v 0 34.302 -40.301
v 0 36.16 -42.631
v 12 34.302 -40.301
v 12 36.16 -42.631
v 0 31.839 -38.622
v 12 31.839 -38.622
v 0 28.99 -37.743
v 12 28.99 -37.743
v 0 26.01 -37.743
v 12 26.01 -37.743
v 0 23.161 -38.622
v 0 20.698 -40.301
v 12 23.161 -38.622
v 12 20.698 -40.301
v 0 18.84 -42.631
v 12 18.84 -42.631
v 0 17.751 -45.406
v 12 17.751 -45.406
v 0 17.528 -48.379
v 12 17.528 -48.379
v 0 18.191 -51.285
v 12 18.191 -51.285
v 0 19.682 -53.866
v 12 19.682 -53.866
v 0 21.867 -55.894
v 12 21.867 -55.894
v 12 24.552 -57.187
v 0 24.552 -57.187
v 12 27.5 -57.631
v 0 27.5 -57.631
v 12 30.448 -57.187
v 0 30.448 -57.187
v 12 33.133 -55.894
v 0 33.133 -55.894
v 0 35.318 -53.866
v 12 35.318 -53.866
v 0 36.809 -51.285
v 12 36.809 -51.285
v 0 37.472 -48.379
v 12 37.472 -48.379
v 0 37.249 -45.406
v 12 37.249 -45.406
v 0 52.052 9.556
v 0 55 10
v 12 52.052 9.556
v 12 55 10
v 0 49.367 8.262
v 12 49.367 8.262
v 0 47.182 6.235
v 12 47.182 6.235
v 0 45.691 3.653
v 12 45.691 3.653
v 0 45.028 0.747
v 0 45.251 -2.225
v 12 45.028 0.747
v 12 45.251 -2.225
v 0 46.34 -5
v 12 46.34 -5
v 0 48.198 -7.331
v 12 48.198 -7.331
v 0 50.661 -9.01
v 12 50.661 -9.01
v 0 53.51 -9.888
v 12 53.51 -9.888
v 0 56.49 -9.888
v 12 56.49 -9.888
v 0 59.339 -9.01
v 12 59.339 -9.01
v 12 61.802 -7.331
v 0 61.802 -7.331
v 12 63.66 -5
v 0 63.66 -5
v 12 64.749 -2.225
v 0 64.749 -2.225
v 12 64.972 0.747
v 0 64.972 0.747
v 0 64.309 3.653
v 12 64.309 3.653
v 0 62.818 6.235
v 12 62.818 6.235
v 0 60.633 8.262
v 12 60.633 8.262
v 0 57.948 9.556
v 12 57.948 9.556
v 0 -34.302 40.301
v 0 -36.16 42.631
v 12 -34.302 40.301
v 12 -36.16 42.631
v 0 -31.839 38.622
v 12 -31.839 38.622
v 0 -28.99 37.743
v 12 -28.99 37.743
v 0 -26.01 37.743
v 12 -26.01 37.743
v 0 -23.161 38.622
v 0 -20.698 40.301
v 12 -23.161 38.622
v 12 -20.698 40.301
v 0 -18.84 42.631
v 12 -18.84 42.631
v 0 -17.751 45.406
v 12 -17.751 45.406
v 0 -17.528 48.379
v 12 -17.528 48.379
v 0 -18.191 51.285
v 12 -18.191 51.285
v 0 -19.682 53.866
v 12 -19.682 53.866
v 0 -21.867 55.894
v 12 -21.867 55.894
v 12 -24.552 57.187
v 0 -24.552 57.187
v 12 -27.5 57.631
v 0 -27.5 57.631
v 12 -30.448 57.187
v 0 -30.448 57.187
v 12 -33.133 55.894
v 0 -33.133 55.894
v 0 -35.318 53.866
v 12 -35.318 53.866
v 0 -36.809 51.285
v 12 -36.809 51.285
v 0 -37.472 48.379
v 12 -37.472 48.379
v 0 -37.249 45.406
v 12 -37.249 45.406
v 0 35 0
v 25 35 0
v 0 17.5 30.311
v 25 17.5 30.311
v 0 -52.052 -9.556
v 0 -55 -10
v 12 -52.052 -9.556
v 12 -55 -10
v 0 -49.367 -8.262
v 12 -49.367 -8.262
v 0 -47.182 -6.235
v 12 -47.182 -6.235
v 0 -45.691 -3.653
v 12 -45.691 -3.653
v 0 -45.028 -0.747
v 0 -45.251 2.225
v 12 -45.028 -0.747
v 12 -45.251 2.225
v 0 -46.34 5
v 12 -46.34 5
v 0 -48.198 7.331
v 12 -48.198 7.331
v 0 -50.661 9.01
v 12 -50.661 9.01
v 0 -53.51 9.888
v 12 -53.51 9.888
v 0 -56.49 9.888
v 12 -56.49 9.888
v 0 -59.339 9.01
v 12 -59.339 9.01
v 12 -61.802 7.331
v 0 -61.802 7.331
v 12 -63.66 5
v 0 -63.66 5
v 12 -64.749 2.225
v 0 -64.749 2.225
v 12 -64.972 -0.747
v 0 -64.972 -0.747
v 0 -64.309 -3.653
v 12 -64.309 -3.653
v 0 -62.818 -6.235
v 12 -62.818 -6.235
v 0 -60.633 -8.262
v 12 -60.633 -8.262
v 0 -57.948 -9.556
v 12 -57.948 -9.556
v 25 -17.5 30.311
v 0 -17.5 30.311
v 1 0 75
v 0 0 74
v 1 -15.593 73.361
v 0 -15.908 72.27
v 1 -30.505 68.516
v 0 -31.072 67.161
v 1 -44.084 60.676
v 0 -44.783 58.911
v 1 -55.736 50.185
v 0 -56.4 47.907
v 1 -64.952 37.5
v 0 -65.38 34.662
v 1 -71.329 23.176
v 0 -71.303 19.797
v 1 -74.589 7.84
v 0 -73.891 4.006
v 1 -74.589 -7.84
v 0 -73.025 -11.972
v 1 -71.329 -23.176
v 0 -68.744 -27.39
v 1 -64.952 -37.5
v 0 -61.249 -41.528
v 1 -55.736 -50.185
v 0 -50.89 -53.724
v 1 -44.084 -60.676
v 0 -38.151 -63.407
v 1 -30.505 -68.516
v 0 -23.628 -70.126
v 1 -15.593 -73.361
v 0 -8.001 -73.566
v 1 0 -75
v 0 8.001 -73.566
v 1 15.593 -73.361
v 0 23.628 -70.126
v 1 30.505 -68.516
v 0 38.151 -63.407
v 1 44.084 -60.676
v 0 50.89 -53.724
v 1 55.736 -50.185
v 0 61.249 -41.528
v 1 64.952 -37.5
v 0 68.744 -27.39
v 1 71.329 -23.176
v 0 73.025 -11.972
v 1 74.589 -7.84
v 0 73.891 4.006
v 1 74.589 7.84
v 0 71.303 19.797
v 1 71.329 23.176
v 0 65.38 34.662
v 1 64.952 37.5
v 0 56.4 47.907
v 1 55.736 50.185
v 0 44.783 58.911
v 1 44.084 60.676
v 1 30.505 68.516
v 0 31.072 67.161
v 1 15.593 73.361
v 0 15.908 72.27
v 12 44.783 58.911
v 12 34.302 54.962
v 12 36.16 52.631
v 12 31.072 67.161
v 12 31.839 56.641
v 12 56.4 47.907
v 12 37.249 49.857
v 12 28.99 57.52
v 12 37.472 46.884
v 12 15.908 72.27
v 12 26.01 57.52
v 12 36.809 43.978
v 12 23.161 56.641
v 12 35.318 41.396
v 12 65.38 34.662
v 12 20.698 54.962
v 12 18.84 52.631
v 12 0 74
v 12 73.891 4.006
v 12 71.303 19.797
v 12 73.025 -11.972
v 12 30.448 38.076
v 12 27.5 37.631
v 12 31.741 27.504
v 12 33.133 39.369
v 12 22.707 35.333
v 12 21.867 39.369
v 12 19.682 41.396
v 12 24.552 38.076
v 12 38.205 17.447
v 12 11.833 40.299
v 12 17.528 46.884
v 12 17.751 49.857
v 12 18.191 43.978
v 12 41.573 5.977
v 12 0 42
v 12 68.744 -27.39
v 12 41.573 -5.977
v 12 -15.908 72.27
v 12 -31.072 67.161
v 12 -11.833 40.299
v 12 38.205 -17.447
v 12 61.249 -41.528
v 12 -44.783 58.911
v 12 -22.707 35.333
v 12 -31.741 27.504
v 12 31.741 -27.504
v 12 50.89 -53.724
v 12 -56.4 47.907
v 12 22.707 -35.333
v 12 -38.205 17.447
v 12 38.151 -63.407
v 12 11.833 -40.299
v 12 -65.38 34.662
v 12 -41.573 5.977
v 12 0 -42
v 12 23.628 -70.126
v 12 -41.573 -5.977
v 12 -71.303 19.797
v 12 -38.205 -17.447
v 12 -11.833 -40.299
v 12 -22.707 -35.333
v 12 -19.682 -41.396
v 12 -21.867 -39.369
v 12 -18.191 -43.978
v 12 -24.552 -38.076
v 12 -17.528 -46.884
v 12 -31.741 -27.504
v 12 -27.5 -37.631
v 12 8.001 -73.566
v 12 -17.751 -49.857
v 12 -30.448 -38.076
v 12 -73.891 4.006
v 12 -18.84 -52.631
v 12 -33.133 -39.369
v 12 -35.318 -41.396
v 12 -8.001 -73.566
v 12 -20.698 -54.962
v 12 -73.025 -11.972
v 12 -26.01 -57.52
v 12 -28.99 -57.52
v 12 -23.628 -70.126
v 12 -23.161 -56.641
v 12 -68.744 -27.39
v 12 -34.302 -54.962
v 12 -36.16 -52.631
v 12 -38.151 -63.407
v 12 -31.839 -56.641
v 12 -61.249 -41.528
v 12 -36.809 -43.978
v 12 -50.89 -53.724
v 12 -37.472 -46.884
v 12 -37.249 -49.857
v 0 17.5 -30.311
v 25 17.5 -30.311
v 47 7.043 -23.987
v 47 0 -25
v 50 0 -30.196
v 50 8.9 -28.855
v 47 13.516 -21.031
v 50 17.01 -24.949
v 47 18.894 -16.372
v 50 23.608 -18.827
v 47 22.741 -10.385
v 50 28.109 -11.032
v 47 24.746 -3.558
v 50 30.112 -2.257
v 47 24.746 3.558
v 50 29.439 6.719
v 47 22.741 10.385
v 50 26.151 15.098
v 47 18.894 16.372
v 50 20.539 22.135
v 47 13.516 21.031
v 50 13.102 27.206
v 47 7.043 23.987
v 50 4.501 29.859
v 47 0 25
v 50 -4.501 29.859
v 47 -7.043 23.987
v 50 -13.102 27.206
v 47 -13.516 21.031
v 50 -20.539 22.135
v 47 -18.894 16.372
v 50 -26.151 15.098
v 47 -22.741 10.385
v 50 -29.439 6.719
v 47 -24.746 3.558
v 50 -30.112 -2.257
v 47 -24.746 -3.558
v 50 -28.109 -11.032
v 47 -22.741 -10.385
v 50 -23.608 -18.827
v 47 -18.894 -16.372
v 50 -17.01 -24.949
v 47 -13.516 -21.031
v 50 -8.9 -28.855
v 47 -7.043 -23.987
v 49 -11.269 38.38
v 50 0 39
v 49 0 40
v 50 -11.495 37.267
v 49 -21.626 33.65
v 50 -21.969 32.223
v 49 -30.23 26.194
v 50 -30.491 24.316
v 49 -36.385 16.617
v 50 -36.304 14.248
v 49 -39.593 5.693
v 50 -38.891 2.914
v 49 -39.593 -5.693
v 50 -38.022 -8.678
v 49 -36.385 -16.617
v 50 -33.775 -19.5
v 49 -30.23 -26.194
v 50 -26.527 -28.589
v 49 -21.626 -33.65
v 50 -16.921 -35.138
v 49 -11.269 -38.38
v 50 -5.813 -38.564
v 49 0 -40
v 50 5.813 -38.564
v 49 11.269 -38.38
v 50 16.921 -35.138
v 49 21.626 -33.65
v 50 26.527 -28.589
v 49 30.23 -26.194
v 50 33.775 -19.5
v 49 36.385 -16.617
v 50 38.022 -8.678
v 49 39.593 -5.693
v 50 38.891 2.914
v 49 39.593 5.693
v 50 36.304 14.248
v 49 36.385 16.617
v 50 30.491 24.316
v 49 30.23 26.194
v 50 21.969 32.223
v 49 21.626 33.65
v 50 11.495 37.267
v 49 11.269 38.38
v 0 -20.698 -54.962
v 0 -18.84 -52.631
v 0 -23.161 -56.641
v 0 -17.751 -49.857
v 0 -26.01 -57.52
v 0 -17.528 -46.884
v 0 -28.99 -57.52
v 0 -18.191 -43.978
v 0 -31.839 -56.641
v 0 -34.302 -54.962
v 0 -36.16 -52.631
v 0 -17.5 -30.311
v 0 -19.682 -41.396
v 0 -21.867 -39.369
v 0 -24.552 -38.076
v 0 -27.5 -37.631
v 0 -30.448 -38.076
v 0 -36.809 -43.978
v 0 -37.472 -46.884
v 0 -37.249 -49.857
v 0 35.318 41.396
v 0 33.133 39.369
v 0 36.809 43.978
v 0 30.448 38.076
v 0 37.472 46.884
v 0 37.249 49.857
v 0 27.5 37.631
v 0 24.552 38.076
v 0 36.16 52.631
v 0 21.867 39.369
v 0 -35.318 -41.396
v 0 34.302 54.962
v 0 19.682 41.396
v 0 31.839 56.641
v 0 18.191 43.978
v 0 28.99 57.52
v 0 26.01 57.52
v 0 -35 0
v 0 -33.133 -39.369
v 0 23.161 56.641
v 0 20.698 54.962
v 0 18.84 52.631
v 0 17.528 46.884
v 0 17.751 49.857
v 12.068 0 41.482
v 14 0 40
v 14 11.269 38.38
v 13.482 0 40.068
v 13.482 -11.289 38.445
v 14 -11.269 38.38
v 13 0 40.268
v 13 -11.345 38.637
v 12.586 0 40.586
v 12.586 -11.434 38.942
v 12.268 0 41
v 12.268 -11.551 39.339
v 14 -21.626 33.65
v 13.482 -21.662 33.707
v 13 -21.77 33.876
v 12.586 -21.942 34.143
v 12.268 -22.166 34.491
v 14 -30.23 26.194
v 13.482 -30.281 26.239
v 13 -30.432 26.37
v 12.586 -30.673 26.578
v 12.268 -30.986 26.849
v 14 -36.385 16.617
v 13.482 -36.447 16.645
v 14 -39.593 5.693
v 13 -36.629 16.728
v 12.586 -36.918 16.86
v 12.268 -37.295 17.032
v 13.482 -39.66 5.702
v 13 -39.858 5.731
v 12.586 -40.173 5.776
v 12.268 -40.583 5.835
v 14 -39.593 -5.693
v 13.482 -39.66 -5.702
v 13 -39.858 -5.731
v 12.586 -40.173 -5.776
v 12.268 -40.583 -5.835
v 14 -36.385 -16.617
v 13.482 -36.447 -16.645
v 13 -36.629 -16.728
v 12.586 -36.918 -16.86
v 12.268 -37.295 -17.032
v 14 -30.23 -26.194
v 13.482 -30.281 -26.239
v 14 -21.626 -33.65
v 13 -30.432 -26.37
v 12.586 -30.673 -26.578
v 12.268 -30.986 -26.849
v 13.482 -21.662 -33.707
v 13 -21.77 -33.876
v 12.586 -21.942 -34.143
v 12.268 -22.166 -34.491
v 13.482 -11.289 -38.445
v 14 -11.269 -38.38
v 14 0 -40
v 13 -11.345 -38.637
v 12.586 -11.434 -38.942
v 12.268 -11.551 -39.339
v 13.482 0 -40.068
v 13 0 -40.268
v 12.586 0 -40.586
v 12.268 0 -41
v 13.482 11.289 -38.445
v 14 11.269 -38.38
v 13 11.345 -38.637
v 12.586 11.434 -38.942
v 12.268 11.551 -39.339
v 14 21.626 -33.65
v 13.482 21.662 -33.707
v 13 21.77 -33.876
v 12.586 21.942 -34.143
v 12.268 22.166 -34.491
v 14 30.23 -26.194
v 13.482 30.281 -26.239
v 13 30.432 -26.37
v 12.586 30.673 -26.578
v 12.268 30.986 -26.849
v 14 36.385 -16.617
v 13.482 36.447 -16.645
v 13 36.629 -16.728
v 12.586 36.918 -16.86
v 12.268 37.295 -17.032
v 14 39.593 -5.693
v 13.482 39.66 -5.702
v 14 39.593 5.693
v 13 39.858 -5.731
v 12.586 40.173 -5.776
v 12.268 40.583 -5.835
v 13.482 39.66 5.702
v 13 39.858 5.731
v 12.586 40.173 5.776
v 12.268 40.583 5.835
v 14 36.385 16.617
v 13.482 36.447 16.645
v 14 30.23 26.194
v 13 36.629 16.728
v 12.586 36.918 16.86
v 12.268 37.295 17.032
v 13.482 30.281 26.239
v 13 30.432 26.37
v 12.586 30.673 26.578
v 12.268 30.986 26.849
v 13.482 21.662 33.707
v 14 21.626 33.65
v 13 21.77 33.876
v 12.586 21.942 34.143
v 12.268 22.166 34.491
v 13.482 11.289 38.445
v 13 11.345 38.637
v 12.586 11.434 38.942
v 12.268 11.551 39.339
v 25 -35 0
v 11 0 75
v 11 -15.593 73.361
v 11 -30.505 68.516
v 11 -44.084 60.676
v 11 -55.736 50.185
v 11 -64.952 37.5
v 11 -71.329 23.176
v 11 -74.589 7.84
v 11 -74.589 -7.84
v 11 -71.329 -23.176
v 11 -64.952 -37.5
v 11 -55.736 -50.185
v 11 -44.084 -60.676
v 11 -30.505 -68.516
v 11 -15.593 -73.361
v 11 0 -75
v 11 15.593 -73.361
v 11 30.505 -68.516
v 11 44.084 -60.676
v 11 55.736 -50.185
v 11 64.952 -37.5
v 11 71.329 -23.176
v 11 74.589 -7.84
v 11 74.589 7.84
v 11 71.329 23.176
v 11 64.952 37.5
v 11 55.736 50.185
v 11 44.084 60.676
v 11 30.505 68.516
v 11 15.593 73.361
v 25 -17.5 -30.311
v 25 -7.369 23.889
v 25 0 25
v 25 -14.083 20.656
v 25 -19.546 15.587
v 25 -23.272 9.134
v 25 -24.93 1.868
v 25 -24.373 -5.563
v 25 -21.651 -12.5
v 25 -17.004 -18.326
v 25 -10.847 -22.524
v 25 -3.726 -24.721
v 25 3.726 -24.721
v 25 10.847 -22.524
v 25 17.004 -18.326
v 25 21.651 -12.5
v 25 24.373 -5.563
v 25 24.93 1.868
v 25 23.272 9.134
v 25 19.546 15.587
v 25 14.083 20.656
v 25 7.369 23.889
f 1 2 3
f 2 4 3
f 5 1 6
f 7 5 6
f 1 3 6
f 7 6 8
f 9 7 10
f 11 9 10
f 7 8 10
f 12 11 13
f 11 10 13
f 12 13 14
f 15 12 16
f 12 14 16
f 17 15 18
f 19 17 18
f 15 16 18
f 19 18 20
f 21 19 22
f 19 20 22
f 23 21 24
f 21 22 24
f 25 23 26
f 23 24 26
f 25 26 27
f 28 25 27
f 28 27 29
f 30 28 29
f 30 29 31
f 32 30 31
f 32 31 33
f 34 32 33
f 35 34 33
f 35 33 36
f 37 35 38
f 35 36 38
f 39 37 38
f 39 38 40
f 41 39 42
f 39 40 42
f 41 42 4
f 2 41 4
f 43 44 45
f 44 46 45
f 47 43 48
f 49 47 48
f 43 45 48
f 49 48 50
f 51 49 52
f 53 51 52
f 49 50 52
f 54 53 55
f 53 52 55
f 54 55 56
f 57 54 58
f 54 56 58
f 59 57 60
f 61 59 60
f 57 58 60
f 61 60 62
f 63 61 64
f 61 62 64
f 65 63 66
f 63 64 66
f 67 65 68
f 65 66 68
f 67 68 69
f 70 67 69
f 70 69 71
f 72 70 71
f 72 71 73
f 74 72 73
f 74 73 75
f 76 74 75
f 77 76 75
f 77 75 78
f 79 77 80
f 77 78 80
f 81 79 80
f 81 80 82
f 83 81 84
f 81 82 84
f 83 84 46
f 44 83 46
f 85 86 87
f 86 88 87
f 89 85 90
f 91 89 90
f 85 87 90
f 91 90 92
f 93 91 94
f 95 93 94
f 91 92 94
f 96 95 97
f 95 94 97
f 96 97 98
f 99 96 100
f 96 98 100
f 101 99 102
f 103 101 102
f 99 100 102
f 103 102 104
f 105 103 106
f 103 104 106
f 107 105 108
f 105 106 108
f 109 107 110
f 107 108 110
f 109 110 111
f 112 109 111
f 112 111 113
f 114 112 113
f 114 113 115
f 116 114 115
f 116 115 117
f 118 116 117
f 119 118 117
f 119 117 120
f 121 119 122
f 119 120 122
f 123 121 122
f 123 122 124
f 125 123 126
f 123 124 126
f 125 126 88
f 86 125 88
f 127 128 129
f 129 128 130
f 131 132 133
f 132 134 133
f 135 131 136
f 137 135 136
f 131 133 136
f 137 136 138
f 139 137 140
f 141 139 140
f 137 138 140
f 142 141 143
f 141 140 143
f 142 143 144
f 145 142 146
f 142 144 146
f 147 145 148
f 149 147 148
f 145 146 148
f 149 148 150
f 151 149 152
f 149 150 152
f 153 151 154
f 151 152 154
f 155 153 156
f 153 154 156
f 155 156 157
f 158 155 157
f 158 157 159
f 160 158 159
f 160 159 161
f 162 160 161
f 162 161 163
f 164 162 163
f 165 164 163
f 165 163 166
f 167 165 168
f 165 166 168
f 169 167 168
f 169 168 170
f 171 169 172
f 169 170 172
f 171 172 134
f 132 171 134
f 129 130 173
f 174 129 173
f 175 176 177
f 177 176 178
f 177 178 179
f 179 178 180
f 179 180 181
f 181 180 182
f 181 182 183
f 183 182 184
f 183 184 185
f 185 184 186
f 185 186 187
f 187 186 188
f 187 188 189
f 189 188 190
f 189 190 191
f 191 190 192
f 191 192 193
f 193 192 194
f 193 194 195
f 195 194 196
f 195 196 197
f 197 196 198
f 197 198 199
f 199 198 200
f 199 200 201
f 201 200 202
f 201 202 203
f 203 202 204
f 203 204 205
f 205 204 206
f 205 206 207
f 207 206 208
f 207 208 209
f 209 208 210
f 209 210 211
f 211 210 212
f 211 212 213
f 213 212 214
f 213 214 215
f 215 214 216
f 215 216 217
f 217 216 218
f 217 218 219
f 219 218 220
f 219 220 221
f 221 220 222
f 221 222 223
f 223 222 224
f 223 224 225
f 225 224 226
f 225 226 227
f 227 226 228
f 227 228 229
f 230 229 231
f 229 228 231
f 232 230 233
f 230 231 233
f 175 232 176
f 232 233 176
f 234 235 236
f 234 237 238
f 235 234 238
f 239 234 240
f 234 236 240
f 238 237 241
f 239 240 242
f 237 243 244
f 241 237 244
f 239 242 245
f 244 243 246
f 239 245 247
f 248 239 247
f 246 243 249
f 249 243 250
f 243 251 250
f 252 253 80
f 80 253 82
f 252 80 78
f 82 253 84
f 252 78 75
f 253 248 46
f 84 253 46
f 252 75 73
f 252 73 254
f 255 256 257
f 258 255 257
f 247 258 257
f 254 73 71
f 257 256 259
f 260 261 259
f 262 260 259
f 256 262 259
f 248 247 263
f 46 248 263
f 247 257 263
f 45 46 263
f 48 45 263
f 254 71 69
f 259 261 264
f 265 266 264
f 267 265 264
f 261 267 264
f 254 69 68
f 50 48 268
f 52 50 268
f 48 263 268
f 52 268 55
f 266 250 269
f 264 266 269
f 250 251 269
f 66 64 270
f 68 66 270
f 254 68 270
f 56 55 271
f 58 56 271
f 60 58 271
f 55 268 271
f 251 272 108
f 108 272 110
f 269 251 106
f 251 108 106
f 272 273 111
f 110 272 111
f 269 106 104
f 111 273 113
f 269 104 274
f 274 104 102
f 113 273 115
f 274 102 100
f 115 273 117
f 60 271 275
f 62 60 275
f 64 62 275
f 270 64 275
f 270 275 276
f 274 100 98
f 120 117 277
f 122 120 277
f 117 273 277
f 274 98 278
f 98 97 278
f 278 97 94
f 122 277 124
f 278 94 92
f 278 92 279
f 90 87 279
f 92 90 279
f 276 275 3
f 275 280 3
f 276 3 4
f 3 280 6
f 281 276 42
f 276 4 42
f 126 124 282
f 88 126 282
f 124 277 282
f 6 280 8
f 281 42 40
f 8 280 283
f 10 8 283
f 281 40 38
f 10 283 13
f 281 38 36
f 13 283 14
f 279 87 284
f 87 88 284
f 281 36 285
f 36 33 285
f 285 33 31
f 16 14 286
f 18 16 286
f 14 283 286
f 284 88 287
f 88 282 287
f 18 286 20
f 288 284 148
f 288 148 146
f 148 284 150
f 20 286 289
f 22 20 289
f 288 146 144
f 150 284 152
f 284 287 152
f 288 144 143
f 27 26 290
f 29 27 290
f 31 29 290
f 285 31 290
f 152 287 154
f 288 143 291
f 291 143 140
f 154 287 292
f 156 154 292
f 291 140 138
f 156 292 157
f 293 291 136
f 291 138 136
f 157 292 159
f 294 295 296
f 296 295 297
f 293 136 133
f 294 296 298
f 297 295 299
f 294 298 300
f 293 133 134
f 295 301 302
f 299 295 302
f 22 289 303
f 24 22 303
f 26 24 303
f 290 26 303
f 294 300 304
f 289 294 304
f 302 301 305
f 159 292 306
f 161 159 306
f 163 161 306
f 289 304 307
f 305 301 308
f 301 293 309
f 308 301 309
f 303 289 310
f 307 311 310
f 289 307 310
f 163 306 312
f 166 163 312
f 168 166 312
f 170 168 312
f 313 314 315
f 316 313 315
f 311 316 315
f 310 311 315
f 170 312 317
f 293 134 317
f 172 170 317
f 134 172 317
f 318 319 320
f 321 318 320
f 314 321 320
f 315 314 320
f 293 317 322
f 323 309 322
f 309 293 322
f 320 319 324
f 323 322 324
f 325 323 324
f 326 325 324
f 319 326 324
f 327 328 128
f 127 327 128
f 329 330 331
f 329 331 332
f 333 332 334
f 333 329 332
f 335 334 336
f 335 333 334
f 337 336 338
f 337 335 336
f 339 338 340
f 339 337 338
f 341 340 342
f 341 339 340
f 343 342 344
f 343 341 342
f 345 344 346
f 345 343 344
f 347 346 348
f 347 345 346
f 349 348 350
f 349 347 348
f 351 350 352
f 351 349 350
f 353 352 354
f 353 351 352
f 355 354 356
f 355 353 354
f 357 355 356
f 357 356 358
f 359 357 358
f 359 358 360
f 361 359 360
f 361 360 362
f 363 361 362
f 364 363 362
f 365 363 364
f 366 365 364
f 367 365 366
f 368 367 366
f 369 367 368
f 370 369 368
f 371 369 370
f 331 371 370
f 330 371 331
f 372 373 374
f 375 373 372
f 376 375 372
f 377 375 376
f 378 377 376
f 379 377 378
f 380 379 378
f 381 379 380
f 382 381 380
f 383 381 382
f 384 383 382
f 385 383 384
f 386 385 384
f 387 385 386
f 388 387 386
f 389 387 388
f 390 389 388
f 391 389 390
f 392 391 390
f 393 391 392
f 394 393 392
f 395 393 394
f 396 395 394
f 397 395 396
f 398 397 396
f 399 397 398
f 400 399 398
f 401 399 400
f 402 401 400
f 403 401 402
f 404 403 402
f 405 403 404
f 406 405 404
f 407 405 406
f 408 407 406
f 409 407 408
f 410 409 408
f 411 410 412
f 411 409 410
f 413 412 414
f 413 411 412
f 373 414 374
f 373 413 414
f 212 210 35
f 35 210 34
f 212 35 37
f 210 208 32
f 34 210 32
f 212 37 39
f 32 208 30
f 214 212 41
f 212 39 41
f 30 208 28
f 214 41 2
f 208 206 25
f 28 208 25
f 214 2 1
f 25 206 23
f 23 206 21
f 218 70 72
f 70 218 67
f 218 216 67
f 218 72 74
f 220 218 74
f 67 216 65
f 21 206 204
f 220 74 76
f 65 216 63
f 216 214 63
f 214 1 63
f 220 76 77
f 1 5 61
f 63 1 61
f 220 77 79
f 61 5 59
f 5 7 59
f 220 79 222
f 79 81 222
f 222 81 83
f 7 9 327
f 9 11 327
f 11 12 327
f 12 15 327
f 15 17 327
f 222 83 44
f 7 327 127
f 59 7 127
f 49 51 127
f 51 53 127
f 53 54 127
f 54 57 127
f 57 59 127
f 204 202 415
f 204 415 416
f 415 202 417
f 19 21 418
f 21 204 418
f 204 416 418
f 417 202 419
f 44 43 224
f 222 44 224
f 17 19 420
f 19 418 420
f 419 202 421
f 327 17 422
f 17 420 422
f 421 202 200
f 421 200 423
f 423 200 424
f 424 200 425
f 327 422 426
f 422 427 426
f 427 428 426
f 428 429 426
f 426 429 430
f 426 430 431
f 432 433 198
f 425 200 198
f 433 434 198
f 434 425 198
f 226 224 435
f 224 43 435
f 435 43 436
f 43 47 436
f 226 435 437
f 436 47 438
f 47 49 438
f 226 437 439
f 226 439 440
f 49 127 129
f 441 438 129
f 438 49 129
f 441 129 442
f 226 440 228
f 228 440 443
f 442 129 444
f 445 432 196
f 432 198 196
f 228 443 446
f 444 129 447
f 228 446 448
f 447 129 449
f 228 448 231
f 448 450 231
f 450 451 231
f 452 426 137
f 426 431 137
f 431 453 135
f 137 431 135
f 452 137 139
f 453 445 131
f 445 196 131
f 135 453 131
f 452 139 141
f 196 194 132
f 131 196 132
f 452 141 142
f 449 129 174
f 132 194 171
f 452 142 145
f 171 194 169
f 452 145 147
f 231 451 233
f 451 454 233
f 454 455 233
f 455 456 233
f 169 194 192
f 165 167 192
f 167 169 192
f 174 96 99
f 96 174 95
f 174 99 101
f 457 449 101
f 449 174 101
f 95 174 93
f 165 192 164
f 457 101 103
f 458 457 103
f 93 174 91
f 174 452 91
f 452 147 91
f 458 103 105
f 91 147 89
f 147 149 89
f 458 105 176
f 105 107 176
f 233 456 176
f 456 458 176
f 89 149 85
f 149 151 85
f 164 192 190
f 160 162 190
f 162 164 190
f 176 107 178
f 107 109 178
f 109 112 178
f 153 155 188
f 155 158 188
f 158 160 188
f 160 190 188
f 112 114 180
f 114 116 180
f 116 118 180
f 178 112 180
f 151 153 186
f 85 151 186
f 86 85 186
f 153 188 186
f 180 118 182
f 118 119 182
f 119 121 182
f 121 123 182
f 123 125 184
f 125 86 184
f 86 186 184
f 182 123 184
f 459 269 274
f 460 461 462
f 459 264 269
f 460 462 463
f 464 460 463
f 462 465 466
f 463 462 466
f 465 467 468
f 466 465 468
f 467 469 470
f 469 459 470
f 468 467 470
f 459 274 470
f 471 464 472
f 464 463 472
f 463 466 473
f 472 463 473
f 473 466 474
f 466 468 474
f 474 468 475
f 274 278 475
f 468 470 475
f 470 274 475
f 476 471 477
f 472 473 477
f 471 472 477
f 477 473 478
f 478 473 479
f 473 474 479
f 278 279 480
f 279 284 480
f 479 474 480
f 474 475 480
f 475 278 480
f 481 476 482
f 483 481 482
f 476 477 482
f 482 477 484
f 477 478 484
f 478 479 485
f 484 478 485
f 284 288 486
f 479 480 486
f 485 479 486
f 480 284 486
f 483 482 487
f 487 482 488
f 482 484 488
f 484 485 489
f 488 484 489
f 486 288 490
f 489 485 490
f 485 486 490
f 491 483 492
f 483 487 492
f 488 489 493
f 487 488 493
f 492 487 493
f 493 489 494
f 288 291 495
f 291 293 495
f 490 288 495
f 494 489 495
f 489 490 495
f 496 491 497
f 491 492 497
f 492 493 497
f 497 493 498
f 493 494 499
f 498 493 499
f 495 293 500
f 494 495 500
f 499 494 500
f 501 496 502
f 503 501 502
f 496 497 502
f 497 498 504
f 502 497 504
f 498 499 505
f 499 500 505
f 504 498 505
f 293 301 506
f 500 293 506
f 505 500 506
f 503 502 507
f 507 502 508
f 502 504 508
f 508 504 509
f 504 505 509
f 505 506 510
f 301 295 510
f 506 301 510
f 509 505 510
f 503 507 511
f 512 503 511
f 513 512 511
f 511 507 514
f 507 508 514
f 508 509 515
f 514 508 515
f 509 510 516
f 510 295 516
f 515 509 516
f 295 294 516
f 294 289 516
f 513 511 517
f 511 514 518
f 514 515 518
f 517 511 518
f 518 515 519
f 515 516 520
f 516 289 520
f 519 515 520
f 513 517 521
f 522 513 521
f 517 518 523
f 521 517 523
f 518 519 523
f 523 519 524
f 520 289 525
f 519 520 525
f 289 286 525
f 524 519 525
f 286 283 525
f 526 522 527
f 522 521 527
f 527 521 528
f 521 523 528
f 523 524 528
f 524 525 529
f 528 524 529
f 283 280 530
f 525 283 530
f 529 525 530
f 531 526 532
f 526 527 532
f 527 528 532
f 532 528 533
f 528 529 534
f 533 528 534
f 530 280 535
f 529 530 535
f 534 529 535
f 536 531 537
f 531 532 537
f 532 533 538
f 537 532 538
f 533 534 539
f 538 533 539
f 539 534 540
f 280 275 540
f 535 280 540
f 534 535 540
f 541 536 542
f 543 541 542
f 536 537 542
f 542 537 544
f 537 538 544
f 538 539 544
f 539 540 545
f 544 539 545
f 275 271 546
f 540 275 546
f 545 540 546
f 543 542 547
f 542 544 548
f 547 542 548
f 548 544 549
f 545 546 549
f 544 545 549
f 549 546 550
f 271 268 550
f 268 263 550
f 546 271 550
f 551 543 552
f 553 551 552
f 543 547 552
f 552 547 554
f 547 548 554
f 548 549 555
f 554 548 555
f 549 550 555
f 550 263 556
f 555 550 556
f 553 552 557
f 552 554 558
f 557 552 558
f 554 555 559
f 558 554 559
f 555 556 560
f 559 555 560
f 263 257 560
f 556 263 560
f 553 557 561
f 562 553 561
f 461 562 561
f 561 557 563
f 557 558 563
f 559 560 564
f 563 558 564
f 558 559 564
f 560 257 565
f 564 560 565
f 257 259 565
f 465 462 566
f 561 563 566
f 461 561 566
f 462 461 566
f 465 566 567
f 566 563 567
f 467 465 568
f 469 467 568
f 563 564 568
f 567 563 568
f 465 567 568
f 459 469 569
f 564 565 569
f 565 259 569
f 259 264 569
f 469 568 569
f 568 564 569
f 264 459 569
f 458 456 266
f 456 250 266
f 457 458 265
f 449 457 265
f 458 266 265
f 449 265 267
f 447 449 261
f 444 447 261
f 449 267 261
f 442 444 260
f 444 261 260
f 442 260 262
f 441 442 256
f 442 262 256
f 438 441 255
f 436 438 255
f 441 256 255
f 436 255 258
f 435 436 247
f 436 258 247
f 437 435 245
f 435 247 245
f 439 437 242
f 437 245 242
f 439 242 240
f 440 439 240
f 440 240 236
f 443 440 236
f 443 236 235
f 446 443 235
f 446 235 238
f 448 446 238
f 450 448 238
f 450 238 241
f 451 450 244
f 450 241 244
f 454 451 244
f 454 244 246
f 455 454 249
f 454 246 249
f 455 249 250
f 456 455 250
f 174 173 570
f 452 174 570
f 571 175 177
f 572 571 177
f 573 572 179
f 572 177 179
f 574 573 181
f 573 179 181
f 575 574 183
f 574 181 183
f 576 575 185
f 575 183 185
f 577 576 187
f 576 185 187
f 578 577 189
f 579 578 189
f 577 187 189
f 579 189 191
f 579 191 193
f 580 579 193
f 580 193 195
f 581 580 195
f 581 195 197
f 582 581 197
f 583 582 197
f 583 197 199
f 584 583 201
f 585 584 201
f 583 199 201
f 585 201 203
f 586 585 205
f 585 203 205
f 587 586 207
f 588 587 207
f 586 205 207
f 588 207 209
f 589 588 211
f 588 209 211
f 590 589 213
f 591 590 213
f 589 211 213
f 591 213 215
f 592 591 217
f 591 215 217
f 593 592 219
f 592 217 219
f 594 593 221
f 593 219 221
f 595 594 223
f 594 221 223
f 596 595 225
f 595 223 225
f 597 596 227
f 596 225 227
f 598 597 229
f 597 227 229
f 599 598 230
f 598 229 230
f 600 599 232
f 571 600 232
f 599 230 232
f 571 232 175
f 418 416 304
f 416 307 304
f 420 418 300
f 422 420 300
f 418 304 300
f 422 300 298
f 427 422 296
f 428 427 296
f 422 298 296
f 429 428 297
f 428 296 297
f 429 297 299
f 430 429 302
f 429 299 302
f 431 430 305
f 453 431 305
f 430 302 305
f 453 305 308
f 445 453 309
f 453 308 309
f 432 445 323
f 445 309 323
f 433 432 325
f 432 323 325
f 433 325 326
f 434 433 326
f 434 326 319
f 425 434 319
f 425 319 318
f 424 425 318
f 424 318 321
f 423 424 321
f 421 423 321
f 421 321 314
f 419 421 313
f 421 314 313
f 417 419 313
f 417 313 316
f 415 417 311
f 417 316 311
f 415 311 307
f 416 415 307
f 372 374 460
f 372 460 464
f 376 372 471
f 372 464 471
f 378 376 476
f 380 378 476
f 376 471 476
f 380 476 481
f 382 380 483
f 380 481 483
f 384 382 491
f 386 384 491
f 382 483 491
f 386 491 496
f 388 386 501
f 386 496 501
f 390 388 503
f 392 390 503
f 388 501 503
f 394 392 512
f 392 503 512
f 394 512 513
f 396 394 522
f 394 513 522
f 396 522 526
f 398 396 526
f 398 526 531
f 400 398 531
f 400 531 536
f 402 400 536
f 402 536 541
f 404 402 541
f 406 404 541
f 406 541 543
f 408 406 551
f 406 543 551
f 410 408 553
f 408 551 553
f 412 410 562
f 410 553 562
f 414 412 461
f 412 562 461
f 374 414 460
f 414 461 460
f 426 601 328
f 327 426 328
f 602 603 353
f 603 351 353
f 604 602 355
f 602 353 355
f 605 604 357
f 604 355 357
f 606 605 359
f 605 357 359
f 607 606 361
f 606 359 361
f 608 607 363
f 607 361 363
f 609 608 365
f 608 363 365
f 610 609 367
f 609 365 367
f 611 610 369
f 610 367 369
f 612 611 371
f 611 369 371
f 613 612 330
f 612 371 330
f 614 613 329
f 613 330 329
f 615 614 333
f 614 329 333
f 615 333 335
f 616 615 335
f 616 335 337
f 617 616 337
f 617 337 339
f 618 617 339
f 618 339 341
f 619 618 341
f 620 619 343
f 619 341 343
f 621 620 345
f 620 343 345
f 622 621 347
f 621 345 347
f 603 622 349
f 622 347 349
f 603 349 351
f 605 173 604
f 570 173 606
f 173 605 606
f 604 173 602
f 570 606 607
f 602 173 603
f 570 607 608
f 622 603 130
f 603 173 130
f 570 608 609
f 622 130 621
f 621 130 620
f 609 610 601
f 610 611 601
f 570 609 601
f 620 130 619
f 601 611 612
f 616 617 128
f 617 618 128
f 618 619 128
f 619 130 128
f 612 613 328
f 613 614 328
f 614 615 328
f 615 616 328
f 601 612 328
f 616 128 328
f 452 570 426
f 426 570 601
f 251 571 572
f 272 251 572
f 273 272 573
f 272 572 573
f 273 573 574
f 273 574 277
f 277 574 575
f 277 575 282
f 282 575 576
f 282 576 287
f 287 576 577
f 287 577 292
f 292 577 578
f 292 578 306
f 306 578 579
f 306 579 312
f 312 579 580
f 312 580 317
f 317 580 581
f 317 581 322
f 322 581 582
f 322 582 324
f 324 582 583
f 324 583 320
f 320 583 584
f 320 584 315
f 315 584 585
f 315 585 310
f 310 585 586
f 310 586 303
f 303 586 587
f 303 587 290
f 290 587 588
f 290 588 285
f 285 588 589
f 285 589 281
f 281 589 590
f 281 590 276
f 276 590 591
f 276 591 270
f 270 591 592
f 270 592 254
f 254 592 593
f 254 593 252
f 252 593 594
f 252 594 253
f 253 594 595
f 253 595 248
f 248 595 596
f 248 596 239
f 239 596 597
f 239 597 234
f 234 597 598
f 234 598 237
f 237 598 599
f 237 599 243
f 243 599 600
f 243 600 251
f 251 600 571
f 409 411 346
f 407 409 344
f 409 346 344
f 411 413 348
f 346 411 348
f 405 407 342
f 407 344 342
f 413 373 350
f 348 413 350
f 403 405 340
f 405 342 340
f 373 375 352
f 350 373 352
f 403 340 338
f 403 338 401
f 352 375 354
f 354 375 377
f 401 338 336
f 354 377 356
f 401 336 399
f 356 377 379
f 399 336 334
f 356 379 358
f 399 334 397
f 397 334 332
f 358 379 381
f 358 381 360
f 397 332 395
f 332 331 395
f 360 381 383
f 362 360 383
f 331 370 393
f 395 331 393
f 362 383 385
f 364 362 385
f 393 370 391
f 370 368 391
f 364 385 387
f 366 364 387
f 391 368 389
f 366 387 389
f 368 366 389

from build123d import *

# Parameters (mm, degrees)
FILLET_2_R               = 2
CHAMFER_2_SIZE           = 1
SKETCH_1_8_W             = 12
SKETCH_1_8_H             = 10
PATTERN_CIRCULAR_1_COUNT = 6
CUT_EXTRUDE_1_DEPTH      = 109.972473589


with BuildPart() as part:
    # Эскиз1 → Повернуть1 (revolve)
    with BuildSketch(Plane.XY):
        Polygon((0, 25), (50, 25), (50, 40), (12, 40), (12, 75), (0, 75), align=None)
    revolve(axis=Axis((0, 0, 0), (1, 0, 0)))

    # Скругление2
    fillet_2_edges = [part.edges().sort_by_distance(p)[0] for p in [
        (12, -40, 0),
    ]]
    fillet(fillet_2_edges, radius=FILLET_2_R)

    # Фаска2
    chamfer_2_edges = [part.edges().sort_by_distance(p)[0] for p in [
        (50, -40, 0),
        (0, -75, 0),
        (12, -75, 0),
    ]]
    chamfer(chamfer_2_edges, length=CHAMFER_2_SIZE)

    # Эскиз1<8> → Вырез-Повернуть1 (revolve, cut)
    with BuildSketch(Plane.XY):
        with Locations((6, 60)):
            Rectangle(SKETCH_1_8_W, SKETCH_1_8_H)
    cut_revolve_1 = revolve(axis=Axis((-8.265772118, 55, 0), (1, 0, 0)), mode=Mode.SUBTRACT)

    # Круговой массив1: Вырез-Повернуть1 ×6 about axis
    pattern_circular_1_axis = Axis((50, 0, 0), (-1, 0, 0))
    for i in range(1, PATTERN_CIRCULAR_1_COUNT):
        add(cut_revolve_1.rotate(pattern_circular_1_axis, i * 360 / PATTERN_CIRCULAR_1_COUNT), mode=Mode.SUBTRACT)

    # Эскиз2 → Вырез-Повернуть3 (revolve, cut)
    with BuildSketch(Plane(origin=(0, 0, 0), x_dir=(1, 0, 0), z_dir=(0, 1, 0))):
        Polygon((47, 25), (50, 25), (50, 30.196152423), align=None)
    revolve(axis=Axis((0, 0, 0), (1, 0, 0)), mode=Mode.SUBTRACT)

    # Эскиз3 → Вырез-Вытянуть1 (cut, through all)
    with BuildSketch(Plane(origin=(25, 0, 0), x_dir=(0, 0, -1), z_dir=(1, 0, 0))):
        Polygon((0, 35), (-30.310889132, 17.5), (-30.310889132, -17.5), (0, -35), (30.310889132, -17.5), (30.310889132, 17.5), align=None)
    extrude(amount=-CUT_EXTRUDE_1_DEPTH, mode=Mode.SUBTRACT)


solid = part.part
